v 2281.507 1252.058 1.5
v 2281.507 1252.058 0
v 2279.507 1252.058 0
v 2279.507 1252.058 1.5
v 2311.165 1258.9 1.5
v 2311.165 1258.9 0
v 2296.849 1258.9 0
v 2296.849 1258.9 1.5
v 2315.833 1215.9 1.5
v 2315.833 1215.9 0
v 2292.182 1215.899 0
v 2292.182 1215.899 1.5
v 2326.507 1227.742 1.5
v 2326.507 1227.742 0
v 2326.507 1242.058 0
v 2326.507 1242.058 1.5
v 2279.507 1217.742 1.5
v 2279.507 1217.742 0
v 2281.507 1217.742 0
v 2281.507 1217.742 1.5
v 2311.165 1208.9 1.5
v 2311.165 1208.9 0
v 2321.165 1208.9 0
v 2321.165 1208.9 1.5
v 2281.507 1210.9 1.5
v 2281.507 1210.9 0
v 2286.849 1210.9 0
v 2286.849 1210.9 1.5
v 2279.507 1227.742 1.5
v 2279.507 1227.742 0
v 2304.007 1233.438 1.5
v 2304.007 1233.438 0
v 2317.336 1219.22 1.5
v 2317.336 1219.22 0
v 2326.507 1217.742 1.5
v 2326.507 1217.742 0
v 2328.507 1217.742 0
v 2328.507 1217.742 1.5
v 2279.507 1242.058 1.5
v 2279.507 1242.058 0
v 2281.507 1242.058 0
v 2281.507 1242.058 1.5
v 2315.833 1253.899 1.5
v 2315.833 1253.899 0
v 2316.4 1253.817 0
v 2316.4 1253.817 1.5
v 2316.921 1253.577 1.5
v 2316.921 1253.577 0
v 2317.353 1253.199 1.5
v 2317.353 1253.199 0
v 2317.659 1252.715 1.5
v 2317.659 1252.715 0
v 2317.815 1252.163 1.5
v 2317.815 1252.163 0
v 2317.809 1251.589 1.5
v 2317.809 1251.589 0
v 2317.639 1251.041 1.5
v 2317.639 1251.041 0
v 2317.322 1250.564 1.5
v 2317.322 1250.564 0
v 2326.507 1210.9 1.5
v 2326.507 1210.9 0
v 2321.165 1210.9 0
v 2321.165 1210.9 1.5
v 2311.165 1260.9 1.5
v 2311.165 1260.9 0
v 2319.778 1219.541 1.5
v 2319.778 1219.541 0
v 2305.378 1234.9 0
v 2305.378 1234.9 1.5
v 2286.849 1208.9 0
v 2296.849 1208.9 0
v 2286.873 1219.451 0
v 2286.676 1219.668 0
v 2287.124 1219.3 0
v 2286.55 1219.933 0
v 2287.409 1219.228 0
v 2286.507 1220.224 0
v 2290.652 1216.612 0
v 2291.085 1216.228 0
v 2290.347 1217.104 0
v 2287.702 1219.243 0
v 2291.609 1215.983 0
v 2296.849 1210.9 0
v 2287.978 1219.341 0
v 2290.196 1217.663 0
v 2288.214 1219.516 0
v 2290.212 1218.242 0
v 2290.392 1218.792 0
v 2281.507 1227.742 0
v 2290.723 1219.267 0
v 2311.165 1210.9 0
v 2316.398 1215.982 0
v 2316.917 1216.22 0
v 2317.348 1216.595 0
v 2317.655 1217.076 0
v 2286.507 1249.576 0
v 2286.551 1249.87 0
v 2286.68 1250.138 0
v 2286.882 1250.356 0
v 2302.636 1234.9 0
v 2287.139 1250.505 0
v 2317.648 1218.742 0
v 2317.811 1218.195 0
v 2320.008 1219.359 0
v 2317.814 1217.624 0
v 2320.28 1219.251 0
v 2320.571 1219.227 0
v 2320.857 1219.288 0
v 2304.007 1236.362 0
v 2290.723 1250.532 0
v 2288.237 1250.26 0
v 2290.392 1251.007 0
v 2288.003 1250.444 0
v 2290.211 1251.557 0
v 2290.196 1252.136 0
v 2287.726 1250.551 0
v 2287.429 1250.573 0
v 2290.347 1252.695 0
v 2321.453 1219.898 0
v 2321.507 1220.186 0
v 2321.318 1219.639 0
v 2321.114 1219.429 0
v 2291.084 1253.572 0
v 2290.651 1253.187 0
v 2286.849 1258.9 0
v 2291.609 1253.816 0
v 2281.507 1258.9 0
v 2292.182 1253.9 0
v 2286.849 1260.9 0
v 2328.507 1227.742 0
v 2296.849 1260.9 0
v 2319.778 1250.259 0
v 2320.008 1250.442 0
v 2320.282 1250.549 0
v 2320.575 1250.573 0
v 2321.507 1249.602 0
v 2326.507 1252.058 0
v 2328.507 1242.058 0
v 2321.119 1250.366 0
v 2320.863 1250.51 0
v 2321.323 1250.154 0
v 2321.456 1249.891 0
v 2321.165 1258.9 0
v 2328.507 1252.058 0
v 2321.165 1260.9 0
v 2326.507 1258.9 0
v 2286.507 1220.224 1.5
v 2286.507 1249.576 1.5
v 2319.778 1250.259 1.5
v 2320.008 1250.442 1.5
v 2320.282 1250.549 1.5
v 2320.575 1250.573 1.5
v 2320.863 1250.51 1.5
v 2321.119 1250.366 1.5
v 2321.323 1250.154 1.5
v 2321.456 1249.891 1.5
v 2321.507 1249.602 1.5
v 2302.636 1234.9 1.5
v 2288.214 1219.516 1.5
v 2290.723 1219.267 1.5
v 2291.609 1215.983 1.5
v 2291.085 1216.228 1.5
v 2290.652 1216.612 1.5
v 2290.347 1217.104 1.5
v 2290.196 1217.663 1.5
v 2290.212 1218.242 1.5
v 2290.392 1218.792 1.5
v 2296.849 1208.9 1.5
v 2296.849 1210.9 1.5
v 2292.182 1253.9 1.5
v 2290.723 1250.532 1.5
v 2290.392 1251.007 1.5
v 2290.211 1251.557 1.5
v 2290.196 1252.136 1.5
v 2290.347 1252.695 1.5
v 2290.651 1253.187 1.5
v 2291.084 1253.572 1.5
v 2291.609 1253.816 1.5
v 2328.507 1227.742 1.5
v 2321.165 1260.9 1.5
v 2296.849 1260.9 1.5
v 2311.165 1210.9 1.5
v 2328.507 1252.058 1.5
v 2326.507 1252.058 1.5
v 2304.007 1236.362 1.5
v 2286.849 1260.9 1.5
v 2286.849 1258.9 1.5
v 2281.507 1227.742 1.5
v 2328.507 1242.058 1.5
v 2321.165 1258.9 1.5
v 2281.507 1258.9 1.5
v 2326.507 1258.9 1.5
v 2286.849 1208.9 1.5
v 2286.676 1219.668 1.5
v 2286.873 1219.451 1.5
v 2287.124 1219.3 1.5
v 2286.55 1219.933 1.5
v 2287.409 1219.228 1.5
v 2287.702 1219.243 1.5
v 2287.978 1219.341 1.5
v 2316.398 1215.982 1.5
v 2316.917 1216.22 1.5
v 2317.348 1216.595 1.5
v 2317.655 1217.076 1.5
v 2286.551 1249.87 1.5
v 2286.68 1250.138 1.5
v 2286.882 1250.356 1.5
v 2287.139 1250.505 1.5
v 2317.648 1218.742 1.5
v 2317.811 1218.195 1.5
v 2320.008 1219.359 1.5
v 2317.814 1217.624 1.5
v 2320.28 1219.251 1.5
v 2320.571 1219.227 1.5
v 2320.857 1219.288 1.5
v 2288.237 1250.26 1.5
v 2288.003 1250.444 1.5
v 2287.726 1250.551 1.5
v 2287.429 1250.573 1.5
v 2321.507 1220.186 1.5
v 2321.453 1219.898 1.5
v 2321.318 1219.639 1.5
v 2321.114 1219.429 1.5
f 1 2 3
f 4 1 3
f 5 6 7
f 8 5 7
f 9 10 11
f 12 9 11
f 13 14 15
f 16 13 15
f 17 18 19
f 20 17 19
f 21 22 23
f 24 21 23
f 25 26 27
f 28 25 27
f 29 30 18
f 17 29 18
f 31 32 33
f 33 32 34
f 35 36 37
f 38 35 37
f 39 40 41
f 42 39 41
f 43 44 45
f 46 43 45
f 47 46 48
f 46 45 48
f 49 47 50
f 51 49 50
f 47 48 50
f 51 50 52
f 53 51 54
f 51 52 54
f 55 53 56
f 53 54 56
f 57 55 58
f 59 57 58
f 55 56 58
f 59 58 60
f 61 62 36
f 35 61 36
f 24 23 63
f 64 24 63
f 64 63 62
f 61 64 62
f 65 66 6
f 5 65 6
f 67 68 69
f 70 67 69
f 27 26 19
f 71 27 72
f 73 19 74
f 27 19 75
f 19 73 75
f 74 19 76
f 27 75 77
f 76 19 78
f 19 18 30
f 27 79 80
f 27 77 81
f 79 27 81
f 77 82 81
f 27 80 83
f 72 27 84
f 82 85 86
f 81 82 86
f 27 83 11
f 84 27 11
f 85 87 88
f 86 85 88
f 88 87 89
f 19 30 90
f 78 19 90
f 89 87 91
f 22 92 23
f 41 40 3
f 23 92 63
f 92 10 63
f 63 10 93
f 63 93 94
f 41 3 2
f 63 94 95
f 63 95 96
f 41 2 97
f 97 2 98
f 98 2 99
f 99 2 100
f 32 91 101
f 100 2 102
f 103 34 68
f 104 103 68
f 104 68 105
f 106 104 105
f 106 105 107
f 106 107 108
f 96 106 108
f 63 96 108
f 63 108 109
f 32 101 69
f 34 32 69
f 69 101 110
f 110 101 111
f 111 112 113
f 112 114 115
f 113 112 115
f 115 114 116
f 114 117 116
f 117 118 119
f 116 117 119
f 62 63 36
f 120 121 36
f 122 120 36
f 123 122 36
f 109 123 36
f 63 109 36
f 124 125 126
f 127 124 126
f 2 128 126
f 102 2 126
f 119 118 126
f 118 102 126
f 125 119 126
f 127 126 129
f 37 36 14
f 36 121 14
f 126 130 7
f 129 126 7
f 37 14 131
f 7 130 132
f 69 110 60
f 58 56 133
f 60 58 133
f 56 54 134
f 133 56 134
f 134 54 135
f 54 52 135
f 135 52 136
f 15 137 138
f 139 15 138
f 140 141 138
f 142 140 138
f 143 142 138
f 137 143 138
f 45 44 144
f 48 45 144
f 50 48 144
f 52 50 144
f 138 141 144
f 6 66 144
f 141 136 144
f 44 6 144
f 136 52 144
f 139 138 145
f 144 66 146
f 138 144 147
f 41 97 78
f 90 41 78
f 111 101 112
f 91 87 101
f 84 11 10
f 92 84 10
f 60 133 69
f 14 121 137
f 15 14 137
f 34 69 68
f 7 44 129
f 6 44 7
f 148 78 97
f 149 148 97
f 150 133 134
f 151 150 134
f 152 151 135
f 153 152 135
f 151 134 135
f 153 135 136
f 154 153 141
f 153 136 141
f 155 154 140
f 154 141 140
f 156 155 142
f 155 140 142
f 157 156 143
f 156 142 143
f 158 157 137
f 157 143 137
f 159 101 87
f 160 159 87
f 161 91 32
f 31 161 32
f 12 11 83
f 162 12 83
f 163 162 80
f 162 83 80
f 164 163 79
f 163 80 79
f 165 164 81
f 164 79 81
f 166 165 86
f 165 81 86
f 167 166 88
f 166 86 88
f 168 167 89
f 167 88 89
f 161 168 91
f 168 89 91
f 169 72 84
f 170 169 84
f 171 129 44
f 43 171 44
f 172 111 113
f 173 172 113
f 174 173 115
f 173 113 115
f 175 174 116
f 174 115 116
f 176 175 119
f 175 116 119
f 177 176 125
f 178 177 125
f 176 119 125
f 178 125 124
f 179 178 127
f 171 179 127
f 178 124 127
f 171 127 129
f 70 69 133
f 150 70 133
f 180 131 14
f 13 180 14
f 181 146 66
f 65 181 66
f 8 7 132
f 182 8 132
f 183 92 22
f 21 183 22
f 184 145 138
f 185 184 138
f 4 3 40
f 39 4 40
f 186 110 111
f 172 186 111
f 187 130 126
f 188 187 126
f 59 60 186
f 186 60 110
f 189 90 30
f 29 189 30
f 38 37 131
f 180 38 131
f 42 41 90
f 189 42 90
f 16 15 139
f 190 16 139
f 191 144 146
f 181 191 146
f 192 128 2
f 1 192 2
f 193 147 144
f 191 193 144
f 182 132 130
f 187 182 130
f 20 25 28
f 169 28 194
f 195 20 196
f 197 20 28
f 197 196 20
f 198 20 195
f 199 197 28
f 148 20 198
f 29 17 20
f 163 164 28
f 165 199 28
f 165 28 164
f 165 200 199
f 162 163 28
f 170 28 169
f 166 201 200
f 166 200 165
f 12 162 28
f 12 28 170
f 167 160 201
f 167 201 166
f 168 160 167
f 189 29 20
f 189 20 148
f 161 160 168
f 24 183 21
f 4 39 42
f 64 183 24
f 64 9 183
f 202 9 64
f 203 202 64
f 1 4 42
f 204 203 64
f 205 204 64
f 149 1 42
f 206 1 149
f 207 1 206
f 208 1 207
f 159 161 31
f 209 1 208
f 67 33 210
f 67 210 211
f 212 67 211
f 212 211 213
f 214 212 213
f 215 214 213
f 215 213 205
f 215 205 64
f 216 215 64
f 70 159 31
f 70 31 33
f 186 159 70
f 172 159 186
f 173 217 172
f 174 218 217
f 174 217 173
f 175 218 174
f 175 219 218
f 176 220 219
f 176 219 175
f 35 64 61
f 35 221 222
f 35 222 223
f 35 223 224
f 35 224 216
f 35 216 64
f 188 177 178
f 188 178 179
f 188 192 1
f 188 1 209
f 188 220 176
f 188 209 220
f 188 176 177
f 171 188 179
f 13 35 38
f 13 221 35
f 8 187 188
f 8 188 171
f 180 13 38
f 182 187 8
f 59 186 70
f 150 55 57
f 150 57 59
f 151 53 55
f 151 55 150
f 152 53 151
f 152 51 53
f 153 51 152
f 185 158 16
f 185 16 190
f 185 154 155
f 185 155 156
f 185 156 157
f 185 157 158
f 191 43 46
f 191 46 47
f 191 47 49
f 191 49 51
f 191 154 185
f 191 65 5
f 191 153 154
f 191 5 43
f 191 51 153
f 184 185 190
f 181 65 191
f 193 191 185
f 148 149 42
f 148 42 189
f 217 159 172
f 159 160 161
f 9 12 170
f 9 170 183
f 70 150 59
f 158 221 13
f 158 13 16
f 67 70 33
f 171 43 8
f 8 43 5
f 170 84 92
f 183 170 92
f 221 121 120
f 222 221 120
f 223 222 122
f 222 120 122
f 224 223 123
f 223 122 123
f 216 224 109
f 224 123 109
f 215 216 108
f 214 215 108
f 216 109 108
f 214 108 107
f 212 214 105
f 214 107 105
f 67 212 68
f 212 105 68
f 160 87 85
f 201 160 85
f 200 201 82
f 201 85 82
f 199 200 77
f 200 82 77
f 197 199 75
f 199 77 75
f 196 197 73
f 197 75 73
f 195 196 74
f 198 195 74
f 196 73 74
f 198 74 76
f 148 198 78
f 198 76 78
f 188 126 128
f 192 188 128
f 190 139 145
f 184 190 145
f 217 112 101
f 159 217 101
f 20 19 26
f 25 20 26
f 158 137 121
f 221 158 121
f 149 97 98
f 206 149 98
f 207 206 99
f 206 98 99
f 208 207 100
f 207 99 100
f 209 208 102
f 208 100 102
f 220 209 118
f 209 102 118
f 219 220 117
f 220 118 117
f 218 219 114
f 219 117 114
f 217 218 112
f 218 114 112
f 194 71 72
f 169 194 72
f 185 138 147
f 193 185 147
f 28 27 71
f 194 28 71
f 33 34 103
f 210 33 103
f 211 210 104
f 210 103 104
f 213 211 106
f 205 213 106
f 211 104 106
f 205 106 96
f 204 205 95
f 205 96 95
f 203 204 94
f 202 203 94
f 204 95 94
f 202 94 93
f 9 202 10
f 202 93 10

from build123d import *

# Parameters (mm, degrees)
EXTRUDE_1_DEPTH = 1.5


with BuildPart() as part:
    # 草图1 → 凸台-拉伸1 (new body)
    with BuildSketch(Plane.XY):
        Polygon((2296.848886703, 1258.899784257), (2296.848886703, 1260.899784257), (2286.848886703, 1260.899784257), (2286.848886703, 1258.899784257), (2281.507070967, 1258.899784257), (2281.507070967, 1252.057968521), (2279.507070967, 1252.057968521), (2279.507070967, 1242.057968521), (2281.507070967, 1242.057968521), (2281.507070967, 1227.741599993), (2279.507070967, 1227.741599993), (2279.507070967, 1217.741599993), (2281.507070967, 1217.741599993), (2281.507070967, 1210.899784257), (2286.848886703, 1210.899784257), (2286.848886703, 1208.899784257), (2296.848886703, 1208.899784257), (2296.848886703, 1210.899784257), (2311.165255231, 1210.899784257), (2311.165255231, 1208.899784257), (2321.165255231, 1208.899784257), (2321.165255231, 1210.899784257), (2326.507070967, 1210.899784257), (2326.507070967, 1217.741599993), (2328.507070967, 1217.741599993), (2328.507070967, 1227.741599993), (2326.507070967, 1227.741599993), (2326.507070967, 1242.057968521), (2328.507070967, 1242.057968521), (2328.507070967, 1252.057968521), (2326.507070967, 1252.057968521), (2326.507070967, 1258.899784257), (2321.165255231, 1258.899784257), (2321.165255231, 1260.899784257), (2311.165255231, 1260.899784257), (2311.165255231, 1258.899784257), (2304.007070967, 1258.899784257), align=None)
        with BuildLine():
            ThreePointArc((2286.507070967, 1249.575559728), (2287.139332676, 1250.505489053), (2288.236608066, 1250.259500969))
            Line((2288.236608066, 1250.259500969), (2302.636365199, 1234.899764783))
            Line((2302.636365199, 1234.899764783), (2288.21378563, 1219.515654308))
            ThreePointArc((2288.21378563, 1219.515654308), (2287.124283961, 1219.299885135), (2286.507473515, 1220.223527434))
            Line((2286.507473515, 1220.223527434), (2286.507070967, 1249.575559728))
        make_face(mode=Mode.SUBTRACT)
        with BuildLine():
            Line((2290.723117316, 1219.267300568), (2304.007052849, 1233.437698409))
            Line((2304.007052849, 1233.437698409), (2317.335840115, 1219.220329728))
            ThreePointArc((2317.335840115, 1219.220329728), (2317.655344671, 1217.075780213), (2315.833356966, 1215.900392367))
            Line((2315.833356966, 1215.900392367), (2292.182284313, 1215.899458558))
            ThreePointArc((2292.182284313, 1215.899458558), (2290.347072244, 1217.104349752), (2290.723117316, 1219.267300568))
        make_face(mode=Mode.SUBTRACT)
        with BuildLine():
            ThreePointArc((2319.77790316, 1250.259120778), (2320.862789914, 1250.509889131), (2321.507070967, 1249.601722869))
            Line((2321.507070967, 1249.601722869), (2321.507070967, 1220.185997989))
            ThreePointArc((2321.507070967, 1220.185997989), (2320.857447426, 1219.287966637), (2319.778324446, 1219.540878969))
            Line((2319.778324446, 1219.540878969), (2305.377777603, 1234.89980238))
            Line((2305.377777603, 1234.89980238), (2319.77790316, 1250.259120778))
        make_face(mode=Mode.SUBTRACT)
        with BuildLine():
            Line((2304.007088097, 1236.36187164), (2290.722688538, 1250.531902224))
            ThreePointArc((2290.722688538, 1250.531902224), (2290.346584138, 1252.694842725), (2292.181763157, 1253.899784257))
            Line((2292.181763157, 1253.899784257), (2315.832835828, 1253.899499172))
            ThreePointArc((2315.832835828, 1253.899499172), (2317.659143856, 1252.714620558), (2317.32152184, 1250.563957934))
            Line((2317.32152184, 1250.563957934), (2304.007088097, 1236.36187164))
        make_face(mode=Mode.SUBTRACT)
    extrude(amount=EXTRUDE_1_DEPTH)


solid = part.part
